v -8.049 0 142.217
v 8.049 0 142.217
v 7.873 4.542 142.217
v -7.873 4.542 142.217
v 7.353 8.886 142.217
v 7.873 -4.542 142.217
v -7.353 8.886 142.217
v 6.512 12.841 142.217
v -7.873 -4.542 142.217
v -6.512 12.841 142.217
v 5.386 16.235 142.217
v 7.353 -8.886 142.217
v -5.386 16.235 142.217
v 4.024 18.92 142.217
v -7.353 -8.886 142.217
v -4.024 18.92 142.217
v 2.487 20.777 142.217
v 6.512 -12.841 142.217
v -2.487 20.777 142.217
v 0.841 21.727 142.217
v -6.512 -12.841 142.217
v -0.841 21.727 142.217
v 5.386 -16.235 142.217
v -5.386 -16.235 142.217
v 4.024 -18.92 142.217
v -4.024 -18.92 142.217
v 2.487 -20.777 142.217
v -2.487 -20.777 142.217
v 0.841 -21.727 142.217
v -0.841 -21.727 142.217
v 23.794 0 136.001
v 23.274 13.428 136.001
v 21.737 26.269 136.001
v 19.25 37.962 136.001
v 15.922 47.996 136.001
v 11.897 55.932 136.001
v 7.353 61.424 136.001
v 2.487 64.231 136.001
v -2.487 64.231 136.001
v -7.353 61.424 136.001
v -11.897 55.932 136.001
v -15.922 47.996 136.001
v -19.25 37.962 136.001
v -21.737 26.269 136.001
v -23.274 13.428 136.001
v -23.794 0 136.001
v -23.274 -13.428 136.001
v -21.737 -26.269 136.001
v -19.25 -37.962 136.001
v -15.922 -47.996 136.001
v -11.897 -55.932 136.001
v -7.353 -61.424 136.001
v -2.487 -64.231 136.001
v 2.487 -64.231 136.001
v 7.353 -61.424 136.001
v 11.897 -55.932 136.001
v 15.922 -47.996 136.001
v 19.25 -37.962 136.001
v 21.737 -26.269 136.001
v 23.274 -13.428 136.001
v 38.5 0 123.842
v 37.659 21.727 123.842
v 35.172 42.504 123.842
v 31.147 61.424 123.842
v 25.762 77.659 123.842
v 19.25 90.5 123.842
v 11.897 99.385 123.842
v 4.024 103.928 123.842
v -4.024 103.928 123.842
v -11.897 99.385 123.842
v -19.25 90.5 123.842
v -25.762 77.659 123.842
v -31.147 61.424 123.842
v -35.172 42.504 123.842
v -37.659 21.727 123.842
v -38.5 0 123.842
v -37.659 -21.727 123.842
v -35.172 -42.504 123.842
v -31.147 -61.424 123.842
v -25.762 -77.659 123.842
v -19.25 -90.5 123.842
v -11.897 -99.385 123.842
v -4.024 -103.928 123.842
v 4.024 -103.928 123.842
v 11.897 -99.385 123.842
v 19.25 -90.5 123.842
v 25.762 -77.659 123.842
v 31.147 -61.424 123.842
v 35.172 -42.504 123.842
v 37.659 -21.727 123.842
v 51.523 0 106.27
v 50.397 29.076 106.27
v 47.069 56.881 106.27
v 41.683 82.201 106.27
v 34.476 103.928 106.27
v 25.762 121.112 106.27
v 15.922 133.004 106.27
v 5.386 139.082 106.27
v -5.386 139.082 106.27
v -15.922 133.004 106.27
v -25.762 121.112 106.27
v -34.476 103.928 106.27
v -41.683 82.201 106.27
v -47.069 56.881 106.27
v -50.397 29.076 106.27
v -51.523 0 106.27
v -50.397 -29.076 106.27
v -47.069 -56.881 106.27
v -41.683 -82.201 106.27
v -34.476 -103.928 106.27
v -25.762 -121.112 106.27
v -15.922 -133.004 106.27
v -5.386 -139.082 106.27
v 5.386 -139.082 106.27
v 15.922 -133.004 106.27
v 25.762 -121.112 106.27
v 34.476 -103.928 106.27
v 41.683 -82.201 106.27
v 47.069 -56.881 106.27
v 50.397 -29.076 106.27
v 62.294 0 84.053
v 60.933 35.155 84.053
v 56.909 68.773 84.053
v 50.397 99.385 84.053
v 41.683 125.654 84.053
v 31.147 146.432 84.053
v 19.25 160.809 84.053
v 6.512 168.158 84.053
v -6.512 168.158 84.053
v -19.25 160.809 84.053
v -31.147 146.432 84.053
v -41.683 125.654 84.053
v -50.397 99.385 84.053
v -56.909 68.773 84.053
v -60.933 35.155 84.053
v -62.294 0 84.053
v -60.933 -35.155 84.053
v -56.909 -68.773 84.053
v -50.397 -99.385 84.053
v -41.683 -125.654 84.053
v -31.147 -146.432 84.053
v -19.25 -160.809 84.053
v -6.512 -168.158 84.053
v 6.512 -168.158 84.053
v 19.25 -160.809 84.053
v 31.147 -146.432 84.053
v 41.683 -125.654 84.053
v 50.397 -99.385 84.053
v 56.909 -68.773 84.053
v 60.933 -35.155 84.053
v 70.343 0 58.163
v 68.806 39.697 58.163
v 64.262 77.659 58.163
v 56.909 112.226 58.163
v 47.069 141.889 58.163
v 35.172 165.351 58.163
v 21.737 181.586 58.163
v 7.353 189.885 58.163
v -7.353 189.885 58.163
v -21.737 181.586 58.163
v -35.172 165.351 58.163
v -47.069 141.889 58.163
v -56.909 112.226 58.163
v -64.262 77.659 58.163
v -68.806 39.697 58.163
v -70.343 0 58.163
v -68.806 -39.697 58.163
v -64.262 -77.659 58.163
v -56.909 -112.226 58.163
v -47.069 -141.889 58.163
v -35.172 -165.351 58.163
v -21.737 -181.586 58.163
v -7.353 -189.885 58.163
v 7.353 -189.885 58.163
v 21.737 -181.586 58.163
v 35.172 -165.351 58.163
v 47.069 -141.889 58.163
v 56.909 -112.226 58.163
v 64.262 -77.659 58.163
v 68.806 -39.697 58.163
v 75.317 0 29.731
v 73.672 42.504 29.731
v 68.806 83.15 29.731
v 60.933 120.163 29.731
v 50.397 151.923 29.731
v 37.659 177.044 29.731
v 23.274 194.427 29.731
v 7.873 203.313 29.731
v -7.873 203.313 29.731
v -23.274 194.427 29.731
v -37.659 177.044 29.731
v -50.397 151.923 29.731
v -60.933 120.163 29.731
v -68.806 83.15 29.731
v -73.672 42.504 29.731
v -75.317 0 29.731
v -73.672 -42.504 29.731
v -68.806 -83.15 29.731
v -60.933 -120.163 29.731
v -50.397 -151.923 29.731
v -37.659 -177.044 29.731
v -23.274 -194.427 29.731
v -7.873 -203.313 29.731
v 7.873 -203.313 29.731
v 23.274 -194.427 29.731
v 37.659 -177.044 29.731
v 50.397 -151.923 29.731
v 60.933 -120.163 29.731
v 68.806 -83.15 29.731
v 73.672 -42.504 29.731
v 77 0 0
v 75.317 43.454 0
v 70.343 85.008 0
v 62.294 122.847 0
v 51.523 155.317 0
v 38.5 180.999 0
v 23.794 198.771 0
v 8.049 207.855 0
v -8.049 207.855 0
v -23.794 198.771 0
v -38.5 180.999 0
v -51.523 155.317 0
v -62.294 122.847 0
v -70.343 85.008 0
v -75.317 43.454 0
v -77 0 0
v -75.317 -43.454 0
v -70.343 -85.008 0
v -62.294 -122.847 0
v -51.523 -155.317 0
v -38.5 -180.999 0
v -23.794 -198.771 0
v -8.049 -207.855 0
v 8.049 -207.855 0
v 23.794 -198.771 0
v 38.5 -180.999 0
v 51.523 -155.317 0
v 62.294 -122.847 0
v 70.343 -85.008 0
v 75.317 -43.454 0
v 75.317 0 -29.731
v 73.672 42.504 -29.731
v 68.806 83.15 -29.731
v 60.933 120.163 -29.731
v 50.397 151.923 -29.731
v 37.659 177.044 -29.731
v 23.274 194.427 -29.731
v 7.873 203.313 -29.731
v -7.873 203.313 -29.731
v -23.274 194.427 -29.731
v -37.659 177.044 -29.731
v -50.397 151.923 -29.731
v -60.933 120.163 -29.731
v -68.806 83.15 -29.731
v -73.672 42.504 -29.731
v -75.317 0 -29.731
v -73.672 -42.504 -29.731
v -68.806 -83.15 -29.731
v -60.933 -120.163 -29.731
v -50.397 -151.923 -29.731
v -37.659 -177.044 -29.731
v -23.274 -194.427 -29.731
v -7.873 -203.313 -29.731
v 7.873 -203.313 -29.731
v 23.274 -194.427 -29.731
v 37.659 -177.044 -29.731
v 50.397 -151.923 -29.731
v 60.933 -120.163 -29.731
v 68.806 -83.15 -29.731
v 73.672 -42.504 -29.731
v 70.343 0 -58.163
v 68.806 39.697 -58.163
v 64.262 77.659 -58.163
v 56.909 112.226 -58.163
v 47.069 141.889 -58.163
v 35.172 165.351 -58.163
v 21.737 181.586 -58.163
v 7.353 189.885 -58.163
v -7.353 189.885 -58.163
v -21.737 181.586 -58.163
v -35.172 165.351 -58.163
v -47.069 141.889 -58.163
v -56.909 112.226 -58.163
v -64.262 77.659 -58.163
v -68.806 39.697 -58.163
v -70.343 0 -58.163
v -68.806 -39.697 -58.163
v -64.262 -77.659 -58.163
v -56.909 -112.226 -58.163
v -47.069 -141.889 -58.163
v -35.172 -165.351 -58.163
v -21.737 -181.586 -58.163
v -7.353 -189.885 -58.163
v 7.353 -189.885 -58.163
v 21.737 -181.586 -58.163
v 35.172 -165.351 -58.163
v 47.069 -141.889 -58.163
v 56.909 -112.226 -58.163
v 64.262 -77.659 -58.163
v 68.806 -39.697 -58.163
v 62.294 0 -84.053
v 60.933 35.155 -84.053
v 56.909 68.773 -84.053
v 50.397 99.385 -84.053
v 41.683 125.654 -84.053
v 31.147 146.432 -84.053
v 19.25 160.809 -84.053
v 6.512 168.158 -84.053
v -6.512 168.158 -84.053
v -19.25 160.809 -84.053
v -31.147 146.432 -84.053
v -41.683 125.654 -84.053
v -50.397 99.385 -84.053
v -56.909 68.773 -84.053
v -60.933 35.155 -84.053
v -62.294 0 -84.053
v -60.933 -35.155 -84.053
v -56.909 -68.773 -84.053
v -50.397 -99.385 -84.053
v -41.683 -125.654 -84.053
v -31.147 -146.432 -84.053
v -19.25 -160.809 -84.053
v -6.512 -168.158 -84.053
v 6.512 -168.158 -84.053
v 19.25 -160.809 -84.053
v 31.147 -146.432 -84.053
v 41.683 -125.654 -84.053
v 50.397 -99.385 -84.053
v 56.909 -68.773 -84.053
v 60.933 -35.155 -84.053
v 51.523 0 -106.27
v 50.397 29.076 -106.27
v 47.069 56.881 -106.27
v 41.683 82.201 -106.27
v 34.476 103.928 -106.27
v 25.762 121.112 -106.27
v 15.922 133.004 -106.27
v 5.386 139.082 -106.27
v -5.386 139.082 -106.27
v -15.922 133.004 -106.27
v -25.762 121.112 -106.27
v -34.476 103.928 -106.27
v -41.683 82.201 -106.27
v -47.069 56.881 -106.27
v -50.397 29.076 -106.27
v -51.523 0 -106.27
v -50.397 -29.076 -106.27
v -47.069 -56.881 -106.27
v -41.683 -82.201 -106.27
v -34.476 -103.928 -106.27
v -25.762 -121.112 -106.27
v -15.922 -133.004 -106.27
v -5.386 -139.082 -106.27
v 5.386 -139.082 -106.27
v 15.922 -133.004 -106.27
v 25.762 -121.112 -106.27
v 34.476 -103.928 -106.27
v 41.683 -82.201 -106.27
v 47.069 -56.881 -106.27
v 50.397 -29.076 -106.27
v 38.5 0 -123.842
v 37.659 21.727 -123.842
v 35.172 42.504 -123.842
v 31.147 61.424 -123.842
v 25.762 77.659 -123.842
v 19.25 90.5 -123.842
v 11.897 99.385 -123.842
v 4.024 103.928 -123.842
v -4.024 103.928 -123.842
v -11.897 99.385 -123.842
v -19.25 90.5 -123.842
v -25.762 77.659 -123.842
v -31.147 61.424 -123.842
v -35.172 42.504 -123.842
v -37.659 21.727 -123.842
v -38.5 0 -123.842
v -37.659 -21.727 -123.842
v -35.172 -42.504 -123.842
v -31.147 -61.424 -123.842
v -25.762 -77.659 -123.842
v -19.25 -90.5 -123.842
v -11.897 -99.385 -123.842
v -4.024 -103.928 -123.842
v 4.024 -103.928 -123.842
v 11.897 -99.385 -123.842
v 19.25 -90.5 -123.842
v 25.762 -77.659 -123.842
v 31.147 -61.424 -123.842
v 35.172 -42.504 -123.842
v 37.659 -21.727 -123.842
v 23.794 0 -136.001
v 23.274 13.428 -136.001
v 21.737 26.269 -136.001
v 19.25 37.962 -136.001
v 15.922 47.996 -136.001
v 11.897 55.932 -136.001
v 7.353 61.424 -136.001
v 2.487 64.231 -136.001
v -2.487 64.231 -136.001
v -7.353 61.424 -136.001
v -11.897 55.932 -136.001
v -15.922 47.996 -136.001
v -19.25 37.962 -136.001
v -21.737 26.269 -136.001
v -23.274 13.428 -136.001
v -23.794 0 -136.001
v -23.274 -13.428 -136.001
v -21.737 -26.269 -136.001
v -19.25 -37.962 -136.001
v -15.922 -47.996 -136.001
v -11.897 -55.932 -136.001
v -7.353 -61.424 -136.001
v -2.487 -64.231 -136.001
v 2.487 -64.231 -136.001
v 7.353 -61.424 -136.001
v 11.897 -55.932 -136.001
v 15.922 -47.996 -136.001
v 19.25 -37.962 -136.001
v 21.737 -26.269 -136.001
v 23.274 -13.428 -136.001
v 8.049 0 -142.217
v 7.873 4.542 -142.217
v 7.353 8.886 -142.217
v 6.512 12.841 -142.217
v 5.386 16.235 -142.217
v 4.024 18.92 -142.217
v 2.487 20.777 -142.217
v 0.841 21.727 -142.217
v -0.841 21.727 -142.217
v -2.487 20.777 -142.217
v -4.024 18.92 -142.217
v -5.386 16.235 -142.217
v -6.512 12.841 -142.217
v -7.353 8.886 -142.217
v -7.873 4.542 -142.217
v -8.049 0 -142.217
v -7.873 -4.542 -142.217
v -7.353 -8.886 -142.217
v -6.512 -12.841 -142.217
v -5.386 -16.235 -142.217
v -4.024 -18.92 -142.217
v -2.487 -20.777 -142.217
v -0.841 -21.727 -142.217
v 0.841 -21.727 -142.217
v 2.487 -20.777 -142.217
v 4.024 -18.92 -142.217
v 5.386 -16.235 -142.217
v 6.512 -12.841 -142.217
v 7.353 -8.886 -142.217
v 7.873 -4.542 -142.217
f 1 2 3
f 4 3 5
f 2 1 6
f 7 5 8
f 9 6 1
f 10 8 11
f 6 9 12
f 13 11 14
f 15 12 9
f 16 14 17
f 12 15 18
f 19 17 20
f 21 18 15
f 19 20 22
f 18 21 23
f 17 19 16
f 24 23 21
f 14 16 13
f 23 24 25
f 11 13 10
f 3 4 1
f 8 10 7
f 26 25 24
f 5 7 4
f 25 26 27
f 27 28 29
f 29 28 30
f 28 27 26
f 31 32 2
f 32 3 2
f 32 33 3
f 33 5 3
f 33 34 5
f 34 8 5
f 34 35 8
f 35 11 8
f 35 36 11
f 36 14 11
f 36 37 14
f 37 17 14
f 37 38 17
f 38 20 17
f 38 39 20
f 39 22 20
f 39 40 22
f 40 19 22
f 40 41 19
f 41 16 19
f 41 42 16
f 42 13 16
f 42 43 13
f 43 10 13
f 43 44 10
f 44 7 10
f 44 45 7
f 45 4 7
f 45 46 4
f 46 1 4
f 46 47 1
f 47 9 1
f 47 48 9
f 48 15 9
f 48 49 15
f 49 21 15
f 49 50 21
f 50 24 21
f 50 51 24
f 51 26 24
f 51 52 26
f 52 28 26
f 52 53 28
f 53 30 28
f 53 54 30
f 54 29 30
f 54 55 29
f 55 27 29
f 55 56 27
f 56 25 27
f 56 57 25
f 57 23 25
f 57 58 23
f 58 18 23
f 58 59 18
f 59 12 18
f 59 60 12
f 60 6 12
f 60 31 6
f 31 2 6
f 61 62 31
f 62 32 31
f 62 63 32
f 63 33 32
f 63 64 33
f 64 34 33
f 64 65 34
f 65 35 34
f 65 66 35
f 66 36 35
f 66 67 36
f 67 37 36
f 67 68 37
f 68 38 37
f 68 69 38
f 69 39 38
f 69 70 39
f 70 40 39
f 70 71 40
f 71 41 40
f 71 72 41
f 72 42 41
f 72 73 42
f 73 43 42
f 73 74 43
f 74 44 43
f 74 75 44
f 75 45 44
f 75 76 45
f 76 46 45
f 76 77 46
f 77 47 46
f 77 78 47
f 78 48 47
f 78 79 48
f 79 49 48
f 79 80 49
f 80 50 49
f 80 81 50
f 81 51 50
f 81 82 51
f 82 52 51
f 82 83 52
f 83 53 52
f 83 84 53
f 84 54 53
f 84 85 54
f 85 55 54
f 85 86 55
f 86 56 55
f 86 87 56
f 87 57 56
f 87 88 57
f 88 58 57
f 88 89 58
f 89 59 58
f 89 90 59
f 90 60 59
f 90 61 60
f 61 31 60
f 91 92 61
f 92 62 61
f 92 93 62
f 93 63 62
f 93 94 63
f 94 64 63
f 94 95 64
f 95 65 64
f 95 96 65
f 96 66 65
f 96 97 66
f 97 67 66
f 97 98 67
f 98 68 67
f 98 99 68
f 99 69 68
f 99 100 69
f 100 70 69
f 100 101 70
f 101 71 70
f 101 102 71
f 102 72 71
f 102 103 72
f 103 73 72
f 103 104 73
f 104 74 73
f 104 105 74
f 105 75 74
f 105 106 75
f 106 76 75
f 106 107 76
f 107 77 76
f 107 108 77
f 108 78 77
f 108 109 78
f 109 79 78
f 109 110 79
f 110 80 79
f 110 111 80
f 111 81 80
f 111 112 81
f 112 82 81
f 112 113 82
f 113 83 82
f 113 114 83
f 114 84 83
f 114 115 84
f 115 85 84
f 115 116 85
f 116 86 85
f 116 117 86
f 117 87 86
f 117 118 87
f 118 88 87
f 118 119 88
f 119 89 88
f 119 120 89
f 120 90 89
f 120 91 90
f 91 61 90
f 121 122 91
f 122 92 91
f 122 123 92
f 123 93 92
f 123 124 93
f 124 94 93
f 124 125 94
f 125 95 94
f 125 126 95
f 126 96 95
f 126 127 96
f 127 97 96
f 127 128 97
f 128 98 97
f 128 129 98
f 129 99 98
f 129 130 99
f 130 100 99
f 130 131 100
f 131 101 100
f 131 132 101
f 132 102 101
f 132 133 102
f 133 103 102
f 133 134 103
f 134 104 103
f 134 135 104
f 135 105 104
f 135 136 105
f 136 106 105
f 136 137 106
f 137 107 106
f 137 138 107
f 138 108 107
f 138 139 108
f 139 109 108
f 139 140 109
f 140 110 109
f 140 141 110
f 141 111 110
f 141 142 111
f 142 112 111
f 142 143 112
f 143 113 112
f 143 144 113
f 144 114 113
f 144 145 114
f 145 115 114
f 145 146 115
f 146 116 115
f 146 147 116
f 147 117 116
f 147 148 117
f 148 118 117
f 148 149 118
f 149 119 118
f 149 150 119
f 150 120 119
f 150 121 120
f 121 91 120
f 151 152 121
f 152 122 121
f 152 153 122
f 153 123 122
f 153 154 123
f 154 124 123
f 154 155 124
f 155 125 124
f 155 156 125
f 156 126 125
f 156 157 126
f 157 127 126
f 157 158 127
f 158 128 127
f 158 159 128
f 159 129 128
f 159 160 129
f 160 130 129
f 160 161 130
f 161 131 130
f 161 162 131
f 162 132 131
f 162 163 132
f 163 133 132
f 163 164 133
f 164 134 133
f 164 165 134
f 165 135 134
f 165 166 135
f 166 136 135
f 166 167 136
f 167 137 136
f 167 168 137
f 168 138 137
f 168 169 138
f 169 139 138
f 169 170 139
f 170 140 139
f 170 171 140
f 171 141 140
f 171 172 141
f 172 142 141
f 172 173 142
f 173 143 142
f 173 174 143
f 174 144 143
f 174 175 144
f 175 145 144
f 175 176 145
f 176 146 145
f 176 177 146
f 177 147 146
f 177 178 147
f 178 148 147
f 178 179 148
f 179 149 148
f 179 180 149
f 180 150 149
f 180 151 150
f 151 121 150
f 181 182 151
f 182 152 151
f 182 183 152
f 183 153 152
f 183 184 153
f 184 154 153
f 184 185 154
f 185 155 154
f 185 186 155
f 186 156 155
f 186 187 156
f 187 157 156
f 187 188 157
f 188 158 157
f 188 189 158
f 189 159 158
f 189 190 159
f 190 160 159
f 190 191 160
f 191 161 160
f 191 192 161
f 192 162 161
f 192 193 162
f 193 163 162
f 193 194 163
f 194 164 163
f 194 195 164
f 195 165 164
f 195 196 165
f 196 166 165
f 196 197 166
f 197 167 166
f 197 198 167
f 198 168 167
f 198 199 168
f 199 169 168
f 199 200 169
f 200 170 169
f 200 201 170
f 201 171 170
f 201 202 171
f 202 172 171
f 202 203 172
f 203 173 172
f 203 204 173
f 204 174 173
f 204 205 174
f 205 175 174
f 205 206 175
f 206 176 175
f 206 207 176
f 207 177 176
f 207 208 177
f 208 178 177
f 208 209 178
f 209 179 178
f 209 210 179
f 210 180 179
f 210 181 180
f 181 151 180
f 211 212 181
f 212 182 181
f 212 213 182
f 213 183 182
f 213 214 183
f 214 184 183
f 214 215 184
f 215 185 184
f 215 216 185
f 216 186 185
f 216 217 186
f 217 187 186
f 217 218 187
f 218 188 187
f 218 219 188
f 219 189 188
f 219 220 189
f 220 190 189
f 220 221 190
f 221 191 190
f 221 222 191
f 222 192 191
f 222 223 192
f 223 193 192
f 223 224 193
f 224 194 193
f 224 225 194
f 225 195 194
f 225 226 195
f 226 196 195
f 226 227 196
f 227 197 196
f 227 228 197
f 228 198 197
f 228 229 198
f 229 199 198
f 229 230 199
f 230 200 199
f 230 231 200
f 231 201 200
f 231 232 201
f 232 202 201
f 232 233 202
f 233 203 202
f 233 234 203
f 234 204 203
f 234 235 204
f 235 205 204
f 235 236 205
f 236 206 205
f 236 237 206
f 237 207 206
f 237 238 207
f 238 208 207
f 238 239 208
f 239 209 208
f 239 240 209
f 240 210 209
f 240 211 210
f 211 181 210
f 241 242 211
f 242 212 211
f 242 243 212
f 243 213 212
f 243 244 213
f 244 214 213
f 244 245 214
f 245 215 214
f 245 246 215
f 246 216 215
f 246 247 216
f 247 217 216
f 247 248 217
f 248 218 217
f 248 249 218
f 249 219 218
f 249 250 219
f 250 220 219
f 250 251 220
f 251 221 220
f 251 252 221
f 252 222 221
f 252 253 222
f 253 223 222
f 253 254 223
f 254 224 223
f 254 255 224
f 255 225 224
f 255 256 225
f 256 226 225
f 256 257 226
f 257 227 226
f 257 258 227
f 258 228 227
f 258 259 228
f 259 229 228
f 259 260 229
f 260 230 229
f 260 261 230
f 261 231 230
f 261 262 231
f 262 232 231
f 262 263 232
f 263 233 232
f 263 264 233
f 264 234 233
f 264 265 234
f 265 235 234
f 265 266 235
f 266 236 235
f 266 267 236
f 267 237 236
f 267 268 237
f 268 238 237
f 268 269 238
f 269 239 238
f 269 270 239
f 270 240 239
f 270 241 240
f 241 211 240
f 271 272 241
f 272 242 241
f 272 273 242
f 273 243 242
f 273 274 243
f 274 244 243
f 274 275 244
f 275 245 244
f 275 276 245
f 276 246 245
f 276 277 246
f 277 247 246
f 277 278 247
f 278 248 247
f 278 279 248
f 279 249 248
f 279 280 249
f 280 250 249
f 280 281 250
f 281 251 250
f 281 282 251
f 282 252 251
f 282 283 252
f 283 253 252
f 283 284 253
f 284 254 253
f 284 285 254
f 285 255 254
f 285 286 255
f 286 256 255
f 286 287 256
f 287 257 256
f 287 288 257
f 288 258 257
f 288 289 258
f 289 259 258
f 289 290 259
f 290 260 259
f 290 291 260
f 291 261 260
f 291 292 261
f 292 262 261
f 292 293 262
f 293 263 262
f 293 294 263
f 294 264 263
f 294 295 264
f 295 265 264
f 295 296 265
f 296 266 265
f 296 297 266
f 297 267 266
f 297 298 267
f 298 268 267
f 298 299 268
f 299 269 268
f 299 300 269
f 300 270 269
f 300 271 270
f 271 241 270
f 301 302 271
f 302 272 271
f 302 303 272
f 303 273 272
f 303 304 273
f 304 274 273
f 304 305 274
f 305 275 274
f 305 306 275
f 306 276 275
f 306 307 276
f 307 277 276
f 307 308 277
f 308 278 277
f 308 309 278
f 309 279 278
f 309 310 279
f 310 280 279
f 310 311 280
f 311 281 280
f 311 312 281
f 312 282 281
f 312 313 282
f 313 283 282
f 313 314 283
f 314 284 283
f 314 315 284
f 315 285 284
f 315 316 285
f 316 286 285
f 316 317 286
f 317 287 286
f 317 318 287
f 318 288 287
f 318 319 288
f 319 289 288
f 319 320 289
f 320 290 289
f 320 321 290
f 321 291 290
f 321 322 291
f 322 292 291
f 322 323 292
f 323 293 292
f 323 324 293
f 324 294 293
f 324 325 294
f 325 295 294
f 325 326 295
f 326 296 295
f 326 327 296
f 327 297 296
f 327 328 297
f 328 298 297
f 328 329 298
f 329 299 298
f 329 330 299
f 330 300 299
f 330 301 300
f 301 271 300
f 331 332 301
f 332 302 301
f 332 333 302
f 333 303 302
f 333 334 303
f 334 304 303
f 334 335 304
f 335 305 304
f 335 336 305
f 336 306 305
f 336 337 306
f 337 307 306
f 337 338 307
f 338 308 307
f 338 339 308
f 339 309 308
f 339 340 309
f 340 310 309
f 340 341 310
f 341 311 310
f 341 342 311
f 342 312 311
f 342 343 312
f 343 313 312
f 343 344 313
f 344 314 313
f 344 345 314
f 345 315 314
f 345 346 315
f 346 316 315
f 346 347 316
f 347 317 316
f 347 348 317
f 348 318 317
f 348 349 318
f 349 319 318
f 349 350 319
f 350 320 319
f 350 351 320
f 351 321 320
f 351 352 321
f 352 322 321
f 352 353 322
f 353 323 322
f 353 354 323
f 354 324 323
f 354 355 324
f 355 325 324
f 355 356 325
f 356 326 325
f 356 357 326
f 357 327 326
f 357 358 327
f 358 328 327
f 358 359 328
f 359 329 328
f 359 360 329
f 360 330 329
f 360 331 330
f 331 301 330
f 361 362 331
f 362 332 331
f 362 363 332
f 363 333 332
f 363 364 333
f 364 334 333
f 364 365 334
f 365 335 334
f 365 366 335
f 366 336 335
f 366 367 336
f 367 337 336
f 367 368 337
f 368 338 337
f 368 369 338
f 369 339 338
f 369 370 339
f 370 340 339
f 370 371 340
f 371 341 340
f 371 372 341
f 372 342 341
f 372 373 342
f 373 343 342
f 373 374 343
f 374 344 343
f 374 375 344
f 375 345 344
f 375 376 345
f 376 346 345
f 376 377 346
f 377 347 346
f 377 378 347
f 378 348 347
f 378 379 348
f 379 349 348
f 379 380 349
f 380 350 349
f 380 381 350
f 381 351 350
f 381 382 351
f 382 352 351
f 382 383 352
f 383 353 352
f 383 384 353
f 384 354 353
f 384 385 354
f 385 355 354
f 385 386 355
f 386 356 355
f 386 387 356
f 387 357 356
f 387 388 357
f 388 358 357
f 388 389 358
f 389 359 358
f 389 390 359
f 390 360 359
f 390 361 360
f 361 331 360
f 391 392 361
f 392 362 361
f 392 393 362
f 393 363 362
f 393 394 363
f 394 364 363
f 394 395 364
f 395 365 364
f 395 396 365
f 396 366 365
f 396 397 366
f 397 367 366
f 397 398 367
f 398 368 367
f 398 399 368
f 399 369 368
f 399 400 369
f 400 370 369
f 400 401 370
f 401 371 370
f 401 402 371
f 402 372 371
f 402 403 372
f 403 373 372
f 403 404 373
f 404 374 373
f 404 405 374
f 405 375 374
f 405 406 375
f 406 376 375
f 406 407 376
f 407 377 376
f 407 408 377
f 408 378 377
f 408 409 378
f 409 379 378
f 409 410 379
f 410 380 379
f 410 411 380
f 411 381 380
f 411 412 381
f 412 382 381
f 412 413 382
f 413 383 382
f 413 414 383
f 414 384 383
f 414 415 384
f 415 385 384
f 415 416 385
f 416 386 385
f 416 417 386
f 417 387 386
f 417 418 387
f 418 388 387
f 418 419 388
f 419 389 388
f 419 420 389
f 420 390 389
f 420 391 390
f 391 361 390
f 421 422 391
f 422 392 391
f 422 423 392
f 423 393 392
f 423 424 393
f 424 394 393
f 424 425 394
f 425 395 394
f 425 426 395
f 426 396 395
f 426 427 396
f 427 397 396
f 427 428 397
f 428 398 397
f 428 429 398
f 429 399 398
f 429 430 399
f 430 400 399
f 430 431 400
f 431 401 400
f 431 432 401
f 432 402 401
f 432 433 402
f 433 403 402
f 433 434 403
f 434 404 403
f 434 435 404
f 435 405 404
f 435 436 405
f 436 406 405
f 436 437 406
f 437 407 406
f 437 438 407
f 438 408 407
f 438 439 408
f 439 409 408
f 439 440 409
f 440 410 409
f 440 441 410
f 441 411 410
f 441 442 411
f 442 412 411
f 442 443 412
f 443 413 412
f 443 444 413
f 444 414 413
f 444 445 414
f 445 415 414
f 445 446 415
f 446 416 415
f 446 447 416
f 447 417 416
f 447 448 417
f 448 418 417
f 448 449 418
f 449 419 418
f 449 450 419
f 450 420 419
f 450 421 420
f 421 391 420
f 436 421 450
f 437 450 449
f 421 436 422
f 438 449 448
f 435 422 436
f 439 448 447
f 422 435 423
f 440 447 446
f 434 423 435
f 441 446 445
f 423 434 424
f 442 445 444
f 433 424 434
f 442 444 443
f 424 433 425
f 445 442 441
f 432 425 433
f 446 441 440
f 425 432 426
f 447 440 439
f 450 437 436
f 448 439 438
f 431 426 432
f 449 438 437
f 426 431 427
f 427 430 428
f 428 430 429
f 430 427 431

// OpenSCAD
// Generated by SolidPython 1.0.1 on 2020-07-29 00:46:48


scale(v = [7, 19, 13]) {
	sphere(r = 11);
}
/***********************************************
*********      SolidPython code:      **********
************************************************
 
# import packages: SolidPython
from solid import *
from solid.utils import *
from itertools import chain, combinations, permutations


class Resize:

    def __init__(self, scad_file):
        self.scad_file = scad_file
        #self.scad_file = import_scad(scad_file)
        # cone/cylinder param:
        self.r1 = 0
        self.r2 = 0
        self.h = 0
        # rectangular prism param:
        self.w = 0
        self.l = 0
        # ellipse param:
        self.r = 0

    # import OpenScad code (file name corresponds to shape)


    # classify shape + parameters
    def assign(self, param1, param2, param3):
        if self.scad_file == 'cone.scad':
            self.r1 = param1
            self.r2 = param2
            self.h = param3
        elif self.scad_file == 'cylinder.scad':
            self.r1 = param1
            self.r2 = param2
            self.h = param3
        elif self.scad_file == 'rectangularPrism.scad':
            self.h = param1
            self.l = param2
            self.w = param3
        else:
            self.r = param1
            self.h = param2

    # resize parameters
    def iterate(self):
        x = range(3, 20, 2)
        i = 1
        if self.scad_file == 'cone.scad':
            tempList = list(permutations(x, 2))
            for temp in tempList:
                param1 = temp[0]
                param2 = temp[1]
                filepath = 'produced_scad_files/' + 'cone' + str(param1) + '_' + str(param2) + '_' + '.scad'
                scad_render_to_file(cylinder(h=param1, r1=param2, r2=0), filepath)

        elif self.scad_file == 'cylinder.scad':
            tempList = list(permutations(x, 3))
            for temp in tempList:
                param1 = temp[0]
                param2 = temp[1]
                filepath = 'produced_scad_files/' + 'cylinder' + str(param1) + '_' + str(param2) + '_' + '.scad'
                scad_render_to_file(cylinder(h=param1, r1=param2, r2=param2), filepath)

        elif self.scad_file == 'rectangularPrism.scad':
            tempList = list(permutations(x, 3))
            for temp in tempList:
                param1 = temp[0]
                param2 = temp[1]
                param3 = temp[2]
                filepath = 'produced_scad_files/' + 'rectangularPrism' + str(param1) + '_' + str(param2) + '_' + str(
                    param3) + '.scad'
                scad_render_to_file(cube(size=(param1, param2, param3)), filepath)

        elif self.scad_file == 'ellipse.scad':
            tempList = list(permutations(x, 4))
            for temp in tempList:
                param1 = temp[0]
                param2 = temp[1]
                param3 = temp[2]
                param4 = temp[3]
                filepath = 'produced_scad_files/' + 'ellipse' + str(param1) + '_' + str(param2) + '_' + str(param3) + '_' + str(param4) + '.scad'
                scad_render_to_file(scale([param1, param2, param3])(sphere(r=param4)), filepath)

    def render_to_scadfile(self):
        scad_render_to_file(scad, 'example.scad') 
 
************************************************/
